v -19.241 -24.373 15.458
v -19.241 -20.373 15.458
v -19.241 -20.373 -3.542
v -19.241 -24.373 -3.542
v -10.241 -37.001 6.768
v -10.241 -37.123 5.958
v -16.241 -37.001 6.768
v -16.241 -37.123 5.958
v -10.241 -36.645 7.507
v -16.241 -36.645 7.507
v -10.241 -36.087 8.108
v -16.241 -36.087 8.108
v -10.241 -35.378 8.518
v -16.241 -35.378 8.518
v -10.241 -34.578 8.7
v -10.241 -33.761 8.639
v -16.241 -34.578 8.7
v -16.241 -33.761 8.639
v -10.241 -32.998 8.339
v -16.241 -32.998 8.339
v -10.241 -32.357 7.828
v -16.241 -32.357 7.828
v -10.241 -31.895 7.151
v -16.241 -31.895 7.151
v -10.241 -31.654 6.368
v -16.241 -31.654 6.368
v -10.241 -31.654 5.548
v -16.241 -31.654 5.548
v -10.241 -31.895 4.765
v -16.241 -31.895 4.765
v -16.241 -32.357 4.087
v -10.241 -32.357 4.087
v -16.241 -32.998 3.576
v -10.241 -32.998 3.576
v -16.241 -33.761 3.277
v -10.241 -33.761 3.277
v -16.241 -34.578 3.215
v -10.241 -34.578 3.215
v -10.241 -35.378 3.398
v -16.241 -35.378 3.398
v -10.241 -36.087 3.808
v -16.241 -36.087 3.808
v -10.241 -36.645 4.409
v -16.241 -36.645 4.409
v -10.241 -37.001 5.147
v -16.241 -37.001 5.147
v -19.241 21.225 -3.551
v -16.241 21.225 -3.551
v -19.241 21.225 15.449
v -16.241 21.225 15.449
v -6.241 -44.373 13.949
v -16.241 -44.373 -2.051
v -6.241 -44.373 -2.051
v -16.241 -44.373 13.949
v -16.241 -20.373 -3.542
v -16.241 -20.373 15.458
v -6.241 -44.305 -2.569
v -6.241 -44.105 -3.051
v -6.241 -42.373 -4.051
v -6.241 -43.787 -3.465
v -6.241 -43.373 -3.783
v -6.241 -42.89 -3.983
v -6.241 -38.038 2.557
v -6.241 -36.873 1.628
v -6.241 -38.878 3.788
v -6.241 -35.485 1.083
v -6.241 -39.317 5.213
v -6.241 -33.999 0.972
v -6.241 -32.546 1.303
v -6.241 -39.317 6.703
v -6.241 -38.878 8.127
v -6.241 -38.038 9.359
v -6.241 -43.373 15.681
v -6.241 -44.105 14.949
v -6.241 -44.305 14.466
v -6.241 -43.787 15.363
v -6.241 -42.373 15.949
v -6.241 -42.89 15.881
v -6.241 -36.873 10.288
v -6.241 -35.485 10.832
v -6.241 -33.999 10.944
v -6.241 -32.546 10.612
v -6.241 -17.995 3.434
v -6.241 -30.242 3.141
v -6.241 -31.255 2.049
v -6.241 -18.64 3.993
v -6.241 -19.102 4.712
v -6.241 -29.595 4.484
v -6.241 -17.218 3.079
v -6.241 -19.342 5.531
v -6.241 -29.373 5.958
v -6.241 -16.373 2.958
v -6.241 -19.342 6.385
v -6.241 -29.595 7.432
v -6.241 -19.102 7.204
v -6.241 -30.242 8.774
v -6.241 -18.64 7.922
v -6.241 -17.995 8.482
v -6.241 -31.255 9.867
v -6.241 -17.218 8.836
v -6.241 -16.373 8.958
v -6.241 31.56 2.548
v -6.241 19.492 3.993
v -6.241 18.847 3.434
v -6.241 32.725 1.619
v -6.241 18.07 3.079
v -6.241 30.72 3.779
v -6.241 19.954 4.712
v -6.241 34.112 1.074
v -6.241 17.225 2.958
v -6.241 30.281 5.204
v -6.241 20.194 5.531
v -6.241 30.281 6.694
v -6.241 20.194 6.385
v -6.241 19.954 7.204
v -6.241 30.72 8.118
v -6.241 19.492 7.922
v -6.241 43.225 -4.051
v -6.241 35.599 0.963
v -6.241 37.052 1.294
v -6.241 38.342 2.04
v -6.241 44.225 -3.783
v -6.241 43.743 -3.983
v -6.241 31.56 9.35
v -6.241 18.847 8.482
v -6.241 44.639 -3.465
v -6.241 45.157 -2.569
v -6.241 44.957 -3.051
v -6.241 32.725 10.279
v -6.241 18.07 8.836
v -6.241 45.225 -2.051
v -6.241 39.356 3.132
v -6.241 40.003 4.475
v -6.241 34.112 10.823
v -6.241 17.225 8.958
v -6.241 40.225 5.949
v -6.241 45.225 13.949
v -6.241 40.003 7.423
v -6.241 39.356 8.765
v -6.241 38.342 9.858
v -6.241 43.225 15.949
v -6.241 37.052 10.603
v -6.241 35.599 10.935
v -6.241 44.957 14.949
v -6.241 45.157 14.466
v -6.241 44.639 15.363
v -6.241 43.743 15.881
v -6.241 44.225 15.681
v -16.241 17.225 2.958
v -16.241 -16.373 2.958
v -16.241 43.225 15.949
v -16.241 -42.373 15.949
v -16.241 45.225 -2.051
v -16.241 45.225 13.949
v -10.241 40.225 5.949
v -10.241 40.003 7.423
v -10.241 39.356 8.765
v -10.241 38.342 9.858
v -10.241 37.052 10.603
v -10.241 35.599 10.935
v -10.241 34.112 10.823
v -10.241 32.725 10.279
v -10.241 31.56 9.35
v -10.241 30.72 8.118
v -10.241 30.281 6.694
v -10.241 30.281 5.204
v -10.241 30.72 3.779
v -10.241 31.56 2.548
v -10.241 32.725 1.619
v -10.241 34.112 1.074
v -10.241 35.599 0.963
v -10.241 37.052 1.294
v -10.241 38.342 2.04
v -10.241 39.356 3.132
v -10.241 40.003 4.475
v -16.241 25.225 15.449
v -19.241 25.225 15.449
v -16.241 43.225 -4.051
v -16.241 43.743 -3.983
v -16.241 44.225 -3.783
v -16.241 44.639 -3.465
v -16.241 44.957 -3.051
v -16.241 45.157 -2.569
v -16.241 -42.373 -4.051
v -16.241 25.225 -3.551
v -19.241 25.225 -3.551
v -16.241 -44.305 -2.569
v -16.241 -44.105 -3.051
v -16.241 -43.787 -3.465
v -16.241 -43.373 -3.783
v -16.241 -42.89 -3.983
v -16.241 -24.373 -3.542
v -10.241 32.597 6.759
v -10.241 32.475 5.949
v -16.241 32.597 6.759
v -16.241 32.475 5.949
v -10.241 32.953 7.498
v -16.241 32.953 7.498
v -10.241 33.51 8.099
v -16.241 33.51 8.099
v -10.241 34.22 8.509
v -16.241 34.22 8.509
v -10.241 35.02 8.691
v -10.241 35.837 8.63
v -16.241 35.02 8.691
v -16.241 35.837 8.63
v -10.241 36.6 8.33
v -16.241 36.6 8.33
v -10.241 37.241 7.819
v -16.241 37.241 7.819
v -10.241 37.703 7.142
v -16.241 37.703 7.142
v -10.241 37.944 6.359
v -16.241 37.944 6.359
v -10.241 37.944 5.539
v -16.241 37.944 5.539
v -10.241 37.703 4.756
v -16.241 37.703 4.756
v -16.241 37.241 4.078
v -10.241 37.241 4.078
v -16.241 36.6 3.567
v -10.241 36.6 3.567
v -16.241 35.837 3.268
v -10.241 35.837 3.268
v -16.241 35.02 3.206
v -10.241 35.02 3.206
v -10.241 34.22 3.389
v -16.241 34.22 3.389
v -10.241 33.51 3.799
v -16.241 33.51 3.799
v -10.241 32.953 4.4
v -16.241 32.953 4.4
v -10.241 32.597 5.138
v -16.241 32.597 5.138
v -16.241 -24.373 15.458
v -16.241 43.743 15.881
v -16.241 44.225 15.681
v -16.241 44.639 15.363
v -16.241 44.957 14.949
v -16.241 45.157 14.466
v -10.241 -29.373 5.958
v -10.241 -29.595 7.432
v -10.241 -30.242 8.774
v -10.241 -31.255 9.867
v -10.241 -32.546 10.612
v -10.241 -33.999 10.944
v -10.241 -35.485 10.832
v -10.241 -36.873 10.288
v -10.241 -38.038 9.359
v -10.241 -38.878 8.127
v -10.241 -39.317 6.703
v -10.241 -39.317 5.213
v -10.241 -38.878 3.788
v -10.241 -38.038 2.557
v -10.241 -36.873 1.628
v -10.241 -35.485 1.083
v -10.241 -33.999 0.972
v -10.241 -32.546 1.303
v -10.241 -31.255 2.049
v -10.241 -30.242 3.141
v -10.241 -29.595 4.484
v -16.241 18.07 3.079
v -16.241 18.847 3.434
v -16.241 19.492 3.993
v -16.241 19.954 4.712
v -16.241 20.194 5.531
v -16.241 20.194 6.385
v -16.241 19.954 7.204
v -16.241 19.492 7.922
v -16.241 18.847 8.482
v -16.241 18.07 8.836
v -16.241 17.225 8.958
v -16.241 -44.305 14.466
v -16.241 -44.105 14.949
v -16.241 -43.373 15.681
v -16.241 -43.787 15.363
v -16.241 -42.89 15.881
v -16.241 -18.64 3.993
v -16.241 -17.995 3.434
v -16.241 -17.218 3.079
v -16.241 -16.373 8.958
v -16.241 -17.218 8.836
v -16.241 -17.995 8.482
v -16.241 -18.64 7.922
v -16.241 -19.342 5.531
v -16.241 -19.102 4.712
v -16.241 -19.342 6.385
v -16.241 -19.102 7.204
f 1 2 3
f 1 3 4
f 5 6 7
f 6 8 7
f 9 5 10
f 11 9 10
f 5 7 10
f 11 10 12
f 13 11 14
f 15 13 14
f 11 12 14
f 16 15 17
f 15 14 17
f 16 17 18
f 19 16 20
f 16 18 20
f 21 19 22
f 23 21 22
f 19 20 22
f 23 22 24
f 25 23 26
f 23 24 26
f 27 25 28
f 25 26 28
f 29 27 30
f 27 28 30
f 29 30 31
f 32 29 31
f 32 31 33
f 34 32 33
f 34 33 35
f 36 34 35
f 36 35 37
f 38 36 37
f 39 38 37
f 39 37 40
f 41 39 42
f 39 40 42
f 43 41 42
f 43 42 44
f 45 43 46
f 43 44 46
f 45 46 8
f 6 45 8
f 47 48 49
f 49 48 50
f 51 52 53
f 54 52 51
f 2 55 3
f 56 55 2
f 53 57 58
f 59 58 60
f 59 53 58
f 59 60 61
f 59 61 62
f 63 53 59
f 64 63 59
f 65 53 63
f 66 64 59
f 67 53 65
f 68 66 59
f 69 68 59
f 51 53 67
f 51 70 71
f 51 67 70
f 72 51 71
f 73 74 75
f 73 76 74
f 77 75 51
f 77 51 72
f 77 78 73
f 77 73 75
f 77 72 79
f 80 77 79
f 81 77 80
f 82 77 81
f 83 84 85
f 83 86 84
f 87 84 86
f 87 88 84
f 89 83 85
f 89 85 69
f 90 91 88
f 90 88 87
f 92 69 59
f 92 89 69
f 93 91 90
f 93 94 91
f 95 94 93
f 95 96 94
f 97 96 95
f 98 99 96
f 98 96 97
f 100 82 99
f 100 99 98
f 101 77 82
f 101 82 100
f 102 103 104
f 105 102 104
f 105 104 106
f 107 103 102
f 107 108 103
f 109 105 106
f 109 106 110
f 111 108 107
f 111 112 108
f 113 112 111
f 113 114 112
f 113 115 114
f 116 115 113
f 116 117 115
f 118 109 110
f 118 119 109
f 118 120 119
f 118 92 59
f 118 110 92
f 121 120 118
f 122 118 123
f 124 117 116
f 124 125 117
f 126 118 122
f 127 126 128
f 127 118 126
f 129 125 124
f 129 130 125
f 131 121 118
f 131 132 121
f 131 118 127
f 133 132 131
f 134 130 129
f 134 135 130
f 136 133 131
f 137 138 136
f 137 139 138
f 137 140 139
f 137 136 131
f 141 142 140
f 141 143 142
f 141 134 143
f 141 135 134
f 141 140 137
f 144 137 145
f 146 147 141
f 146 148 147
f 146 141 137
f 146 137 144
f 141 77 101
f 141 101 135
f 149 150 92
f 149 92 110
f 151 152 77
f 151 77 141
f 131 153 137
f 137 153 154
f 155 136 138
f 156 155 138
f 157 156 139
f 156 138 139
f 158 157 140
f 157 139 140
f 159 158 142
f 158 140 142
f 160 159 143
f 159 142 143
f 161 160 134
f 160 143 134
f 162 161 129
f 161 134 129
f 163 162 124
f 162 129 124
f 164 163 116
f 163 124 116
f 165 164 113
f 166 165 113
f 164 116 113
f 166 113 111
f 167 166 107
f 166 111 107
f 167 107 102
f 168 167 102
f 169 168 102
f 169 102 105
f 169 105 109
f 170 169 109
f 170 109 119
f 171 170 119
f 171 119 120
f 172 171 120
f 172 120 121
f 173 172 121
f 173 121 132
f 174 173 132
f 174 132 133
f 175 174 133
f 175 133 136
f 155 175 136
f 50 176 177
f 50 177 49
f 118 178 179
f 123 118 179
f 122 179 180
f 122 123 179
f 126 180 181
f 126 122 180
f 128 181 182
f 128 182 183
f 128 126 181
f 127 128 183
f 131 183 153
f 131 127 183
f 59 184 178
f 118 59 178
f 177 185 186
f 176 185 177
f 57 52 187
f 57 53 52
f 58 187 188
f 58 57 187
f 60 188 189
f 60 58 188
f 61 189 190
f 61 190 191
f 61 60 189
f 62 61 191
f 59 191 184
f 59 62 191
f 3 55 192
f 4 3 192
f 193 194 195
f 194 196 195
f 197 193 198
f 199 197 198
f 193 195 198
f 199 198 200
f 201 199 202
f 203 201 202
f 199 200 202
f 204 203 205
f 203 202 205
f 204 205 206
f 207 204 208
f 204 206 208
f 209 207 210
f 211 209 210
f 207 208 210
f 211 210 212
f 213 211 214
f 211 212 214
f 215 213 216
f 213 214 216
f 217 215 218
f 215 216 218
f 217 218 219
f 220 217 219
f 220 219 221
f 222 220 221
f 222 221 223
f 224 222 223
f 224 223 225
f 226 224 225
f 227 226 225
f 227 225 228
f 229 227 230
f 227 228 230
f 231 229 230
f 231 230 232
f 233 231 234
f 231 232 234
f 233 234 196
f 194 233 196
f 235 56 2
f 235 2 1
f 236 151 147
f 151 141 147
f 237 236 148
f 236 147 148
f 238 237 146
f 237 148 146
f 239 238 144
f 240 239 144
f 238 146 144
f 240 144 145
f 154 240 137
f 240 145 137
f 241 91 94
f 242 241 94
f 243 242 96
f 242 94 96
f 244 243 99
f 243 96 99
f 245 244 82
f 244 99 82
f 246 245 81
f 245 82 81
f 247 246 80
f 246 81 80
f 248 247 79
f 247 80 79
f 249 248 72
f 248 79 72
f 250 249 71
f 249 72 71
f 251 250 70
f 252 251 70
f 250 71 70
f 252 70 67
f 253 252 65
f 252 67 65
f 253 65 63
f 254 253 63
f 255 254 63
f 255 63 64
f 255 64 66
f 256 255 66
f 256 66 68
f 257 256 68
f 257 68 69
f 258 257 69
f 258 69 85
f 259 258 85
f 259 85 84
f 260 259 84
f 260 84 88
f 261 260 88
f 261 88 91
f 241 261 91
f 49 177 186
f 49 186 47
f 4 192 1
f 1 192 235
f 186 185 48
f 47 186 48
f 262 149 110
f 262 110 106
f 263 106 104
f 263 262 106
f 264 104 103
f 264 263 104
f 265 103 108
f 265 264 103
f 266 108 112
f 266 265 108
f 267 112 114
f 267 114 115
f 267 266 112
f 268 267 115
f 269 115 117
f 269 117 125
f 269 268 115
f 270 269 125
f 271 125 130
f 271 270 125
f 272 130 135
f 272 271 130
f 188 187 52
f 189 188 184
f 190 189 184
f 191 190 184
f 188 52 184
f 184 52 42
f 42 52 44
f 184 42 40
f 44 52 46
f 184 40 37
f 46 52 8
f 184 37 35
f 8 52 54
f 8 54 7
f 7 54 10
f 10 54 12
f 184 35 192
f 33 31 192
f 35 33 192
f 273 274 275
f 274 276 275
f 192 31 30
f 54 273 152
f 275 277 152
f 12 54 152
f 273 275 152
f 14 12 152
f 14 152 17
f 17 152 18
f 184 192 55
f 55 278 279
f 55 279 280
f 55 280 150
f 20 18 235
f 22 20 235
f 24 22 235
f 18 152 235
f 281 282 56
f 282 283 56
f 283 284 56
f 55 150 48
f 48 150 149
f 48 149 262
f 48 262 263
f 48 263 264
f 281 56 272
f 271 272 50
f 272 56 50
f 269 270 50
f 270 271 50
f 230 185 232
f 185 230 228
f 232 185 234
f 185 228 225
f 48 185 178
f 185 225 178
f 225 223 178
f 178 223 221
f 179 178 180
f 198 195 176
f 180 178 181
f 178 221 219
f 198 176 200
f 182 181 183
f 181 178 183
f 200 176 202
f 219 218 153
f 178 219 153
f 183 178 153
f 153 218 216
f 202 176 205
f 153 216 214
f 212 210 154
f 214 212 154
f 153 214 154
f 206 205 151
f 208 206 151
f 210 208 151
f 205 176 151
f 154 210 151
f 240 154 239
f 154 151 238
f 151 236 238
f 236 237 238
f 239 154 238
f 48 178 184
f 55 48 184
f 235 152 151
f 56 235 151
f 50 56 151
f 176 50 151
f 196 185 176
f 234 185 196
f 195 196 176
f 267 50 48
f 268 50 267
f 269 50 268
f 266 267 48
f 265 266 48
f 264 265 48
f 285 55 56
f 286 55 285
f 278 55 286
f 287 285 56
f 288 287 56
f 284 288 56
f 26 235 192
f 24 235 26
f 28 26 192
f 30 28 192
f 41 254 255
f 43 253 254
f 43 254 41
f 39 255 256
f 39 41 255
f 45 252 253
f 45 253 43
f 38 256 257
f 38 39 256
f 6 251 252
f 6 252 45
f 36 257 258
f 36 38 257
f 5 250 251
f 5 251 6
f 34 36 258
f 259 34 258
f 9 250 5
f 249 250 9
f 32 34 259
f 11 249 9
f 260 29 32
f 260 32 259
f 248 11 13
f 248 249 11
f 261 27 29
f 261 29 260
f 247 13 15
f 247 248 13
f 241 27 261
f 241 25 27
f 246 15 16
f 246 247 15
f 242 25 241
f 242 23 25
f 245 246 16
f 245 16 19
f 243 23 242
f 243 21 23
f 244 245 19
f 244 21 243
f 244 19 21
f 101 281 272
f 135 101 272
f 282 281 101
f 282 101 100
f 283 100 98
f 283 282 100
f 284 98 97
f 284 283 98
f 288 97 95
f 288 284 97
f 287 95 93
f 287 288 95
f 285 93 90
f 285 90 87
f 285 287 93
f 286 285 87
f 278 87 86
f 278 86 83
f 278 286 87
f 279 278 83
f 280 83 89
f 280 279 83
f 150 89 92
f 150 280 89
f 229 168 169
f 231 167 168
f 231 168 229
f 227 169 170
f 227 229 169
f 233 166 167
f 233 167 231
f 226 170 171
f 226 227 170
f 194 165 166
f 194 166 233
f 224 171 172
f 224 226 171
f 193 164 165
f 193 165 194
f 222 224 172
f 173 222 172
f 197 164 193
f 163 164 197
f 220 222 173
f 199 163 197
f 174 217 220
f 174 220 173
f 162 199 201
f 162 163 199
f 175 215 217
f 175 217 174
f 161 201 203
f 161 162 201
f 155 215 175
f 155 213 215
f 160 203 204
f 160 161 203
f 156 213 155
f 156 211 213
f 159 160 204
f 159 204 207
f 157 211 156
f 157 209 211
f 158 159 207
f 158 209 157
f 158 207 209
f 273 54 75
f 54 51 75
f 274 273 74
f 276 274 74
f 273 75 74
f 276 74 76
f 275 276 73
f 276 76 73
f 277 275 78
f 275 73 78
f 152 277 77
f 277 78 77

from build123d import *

# Parameters (mm, degrees)
SKETCH_W         = 89.59788
SKETCH_H         = 20
PAD_DEPTH        = 10
SKETCH001_W      = 4
SKETCH001_H      = 19
PAD001_DEPTH     = 3
HOLE_D           = 5.5
HOLE_DEPTH       = 25
HOLE_CBORE_D     = 10
HOLE_CBORE_DEPTH = 4
FILLET_R         = 2


with BuildPart() as part:
    # Sketch (on Face2 of Binder) → Pad (new body)
    with BuildSketch(Plane.YZ.offset(237.459106)):
        with Locations((0.426081, 189.84877)):
            Rectangle(SKETCH_W, SKETCH_H)
        with BuildLine():
            ThreePointArc((-16.372859, 192.857809), (-19.372859, 189.857809), (-16.372859, 186.857809))
            Line((-16.372859, 186.857809), (17.225021, 186.857809))
            ThreePointArc((17.225021, 186.857809), (20.225021, 189.857809), (17.225021, 192.857809))
            Line((-16.372859, 192.857809), (17.225021, 192.857809))
        make_face(mode=Mode.SUBTRACT)
    extrude(amount=PAD_DEPTH)

    # Sketch001 (on Face9 of Pad) → Pad001 (join)
    with BuildSketch(Plane(origin=(237.459106, 0, 0), x_dir=(0, -1, 0), z_dir=(-1, 0, 0))):
        with Locations((-23.225021, 189.84877)):
            Rectangle(SKETCH001_W, SKETCH001_H)
        with Locations((22.372859, 189.857809)):
            Rectangle(SKETCH001_W, SKETCH001_H)
    extrude(amount=PAD001_DEPTH)

    # Hole
    with Locations(Plane.YZ.offset(247.459106)):
        with Locations((-34.372859, 189.857809), (35.225021, 189.84877)):
            CounterBoreHole(HOLE_D / 2, HOLE_CBORE_D / 2, HOLE_CBORE_DEPTH, depth=HOLE_DEPTH)

    # Fillet
    fillet_edges = [part.edges().sort_by_distance(p)[0] for p in [
        (242.459106, 45.225021, 199.84877),
        (242.459106, 45.225021, 179.84877),
        (242.459106, -44.372859, 199.84877),
        (242.459106, -44.372859, 179.84877),
    ]]
    fillet(fillet_edges, radius=FILLET_R)


with BuildPart() as part_1:
    # Body placement: moved
    add(part.part.moved(Location((-253.7, 0, -183.9))))


solid = part_1.part
